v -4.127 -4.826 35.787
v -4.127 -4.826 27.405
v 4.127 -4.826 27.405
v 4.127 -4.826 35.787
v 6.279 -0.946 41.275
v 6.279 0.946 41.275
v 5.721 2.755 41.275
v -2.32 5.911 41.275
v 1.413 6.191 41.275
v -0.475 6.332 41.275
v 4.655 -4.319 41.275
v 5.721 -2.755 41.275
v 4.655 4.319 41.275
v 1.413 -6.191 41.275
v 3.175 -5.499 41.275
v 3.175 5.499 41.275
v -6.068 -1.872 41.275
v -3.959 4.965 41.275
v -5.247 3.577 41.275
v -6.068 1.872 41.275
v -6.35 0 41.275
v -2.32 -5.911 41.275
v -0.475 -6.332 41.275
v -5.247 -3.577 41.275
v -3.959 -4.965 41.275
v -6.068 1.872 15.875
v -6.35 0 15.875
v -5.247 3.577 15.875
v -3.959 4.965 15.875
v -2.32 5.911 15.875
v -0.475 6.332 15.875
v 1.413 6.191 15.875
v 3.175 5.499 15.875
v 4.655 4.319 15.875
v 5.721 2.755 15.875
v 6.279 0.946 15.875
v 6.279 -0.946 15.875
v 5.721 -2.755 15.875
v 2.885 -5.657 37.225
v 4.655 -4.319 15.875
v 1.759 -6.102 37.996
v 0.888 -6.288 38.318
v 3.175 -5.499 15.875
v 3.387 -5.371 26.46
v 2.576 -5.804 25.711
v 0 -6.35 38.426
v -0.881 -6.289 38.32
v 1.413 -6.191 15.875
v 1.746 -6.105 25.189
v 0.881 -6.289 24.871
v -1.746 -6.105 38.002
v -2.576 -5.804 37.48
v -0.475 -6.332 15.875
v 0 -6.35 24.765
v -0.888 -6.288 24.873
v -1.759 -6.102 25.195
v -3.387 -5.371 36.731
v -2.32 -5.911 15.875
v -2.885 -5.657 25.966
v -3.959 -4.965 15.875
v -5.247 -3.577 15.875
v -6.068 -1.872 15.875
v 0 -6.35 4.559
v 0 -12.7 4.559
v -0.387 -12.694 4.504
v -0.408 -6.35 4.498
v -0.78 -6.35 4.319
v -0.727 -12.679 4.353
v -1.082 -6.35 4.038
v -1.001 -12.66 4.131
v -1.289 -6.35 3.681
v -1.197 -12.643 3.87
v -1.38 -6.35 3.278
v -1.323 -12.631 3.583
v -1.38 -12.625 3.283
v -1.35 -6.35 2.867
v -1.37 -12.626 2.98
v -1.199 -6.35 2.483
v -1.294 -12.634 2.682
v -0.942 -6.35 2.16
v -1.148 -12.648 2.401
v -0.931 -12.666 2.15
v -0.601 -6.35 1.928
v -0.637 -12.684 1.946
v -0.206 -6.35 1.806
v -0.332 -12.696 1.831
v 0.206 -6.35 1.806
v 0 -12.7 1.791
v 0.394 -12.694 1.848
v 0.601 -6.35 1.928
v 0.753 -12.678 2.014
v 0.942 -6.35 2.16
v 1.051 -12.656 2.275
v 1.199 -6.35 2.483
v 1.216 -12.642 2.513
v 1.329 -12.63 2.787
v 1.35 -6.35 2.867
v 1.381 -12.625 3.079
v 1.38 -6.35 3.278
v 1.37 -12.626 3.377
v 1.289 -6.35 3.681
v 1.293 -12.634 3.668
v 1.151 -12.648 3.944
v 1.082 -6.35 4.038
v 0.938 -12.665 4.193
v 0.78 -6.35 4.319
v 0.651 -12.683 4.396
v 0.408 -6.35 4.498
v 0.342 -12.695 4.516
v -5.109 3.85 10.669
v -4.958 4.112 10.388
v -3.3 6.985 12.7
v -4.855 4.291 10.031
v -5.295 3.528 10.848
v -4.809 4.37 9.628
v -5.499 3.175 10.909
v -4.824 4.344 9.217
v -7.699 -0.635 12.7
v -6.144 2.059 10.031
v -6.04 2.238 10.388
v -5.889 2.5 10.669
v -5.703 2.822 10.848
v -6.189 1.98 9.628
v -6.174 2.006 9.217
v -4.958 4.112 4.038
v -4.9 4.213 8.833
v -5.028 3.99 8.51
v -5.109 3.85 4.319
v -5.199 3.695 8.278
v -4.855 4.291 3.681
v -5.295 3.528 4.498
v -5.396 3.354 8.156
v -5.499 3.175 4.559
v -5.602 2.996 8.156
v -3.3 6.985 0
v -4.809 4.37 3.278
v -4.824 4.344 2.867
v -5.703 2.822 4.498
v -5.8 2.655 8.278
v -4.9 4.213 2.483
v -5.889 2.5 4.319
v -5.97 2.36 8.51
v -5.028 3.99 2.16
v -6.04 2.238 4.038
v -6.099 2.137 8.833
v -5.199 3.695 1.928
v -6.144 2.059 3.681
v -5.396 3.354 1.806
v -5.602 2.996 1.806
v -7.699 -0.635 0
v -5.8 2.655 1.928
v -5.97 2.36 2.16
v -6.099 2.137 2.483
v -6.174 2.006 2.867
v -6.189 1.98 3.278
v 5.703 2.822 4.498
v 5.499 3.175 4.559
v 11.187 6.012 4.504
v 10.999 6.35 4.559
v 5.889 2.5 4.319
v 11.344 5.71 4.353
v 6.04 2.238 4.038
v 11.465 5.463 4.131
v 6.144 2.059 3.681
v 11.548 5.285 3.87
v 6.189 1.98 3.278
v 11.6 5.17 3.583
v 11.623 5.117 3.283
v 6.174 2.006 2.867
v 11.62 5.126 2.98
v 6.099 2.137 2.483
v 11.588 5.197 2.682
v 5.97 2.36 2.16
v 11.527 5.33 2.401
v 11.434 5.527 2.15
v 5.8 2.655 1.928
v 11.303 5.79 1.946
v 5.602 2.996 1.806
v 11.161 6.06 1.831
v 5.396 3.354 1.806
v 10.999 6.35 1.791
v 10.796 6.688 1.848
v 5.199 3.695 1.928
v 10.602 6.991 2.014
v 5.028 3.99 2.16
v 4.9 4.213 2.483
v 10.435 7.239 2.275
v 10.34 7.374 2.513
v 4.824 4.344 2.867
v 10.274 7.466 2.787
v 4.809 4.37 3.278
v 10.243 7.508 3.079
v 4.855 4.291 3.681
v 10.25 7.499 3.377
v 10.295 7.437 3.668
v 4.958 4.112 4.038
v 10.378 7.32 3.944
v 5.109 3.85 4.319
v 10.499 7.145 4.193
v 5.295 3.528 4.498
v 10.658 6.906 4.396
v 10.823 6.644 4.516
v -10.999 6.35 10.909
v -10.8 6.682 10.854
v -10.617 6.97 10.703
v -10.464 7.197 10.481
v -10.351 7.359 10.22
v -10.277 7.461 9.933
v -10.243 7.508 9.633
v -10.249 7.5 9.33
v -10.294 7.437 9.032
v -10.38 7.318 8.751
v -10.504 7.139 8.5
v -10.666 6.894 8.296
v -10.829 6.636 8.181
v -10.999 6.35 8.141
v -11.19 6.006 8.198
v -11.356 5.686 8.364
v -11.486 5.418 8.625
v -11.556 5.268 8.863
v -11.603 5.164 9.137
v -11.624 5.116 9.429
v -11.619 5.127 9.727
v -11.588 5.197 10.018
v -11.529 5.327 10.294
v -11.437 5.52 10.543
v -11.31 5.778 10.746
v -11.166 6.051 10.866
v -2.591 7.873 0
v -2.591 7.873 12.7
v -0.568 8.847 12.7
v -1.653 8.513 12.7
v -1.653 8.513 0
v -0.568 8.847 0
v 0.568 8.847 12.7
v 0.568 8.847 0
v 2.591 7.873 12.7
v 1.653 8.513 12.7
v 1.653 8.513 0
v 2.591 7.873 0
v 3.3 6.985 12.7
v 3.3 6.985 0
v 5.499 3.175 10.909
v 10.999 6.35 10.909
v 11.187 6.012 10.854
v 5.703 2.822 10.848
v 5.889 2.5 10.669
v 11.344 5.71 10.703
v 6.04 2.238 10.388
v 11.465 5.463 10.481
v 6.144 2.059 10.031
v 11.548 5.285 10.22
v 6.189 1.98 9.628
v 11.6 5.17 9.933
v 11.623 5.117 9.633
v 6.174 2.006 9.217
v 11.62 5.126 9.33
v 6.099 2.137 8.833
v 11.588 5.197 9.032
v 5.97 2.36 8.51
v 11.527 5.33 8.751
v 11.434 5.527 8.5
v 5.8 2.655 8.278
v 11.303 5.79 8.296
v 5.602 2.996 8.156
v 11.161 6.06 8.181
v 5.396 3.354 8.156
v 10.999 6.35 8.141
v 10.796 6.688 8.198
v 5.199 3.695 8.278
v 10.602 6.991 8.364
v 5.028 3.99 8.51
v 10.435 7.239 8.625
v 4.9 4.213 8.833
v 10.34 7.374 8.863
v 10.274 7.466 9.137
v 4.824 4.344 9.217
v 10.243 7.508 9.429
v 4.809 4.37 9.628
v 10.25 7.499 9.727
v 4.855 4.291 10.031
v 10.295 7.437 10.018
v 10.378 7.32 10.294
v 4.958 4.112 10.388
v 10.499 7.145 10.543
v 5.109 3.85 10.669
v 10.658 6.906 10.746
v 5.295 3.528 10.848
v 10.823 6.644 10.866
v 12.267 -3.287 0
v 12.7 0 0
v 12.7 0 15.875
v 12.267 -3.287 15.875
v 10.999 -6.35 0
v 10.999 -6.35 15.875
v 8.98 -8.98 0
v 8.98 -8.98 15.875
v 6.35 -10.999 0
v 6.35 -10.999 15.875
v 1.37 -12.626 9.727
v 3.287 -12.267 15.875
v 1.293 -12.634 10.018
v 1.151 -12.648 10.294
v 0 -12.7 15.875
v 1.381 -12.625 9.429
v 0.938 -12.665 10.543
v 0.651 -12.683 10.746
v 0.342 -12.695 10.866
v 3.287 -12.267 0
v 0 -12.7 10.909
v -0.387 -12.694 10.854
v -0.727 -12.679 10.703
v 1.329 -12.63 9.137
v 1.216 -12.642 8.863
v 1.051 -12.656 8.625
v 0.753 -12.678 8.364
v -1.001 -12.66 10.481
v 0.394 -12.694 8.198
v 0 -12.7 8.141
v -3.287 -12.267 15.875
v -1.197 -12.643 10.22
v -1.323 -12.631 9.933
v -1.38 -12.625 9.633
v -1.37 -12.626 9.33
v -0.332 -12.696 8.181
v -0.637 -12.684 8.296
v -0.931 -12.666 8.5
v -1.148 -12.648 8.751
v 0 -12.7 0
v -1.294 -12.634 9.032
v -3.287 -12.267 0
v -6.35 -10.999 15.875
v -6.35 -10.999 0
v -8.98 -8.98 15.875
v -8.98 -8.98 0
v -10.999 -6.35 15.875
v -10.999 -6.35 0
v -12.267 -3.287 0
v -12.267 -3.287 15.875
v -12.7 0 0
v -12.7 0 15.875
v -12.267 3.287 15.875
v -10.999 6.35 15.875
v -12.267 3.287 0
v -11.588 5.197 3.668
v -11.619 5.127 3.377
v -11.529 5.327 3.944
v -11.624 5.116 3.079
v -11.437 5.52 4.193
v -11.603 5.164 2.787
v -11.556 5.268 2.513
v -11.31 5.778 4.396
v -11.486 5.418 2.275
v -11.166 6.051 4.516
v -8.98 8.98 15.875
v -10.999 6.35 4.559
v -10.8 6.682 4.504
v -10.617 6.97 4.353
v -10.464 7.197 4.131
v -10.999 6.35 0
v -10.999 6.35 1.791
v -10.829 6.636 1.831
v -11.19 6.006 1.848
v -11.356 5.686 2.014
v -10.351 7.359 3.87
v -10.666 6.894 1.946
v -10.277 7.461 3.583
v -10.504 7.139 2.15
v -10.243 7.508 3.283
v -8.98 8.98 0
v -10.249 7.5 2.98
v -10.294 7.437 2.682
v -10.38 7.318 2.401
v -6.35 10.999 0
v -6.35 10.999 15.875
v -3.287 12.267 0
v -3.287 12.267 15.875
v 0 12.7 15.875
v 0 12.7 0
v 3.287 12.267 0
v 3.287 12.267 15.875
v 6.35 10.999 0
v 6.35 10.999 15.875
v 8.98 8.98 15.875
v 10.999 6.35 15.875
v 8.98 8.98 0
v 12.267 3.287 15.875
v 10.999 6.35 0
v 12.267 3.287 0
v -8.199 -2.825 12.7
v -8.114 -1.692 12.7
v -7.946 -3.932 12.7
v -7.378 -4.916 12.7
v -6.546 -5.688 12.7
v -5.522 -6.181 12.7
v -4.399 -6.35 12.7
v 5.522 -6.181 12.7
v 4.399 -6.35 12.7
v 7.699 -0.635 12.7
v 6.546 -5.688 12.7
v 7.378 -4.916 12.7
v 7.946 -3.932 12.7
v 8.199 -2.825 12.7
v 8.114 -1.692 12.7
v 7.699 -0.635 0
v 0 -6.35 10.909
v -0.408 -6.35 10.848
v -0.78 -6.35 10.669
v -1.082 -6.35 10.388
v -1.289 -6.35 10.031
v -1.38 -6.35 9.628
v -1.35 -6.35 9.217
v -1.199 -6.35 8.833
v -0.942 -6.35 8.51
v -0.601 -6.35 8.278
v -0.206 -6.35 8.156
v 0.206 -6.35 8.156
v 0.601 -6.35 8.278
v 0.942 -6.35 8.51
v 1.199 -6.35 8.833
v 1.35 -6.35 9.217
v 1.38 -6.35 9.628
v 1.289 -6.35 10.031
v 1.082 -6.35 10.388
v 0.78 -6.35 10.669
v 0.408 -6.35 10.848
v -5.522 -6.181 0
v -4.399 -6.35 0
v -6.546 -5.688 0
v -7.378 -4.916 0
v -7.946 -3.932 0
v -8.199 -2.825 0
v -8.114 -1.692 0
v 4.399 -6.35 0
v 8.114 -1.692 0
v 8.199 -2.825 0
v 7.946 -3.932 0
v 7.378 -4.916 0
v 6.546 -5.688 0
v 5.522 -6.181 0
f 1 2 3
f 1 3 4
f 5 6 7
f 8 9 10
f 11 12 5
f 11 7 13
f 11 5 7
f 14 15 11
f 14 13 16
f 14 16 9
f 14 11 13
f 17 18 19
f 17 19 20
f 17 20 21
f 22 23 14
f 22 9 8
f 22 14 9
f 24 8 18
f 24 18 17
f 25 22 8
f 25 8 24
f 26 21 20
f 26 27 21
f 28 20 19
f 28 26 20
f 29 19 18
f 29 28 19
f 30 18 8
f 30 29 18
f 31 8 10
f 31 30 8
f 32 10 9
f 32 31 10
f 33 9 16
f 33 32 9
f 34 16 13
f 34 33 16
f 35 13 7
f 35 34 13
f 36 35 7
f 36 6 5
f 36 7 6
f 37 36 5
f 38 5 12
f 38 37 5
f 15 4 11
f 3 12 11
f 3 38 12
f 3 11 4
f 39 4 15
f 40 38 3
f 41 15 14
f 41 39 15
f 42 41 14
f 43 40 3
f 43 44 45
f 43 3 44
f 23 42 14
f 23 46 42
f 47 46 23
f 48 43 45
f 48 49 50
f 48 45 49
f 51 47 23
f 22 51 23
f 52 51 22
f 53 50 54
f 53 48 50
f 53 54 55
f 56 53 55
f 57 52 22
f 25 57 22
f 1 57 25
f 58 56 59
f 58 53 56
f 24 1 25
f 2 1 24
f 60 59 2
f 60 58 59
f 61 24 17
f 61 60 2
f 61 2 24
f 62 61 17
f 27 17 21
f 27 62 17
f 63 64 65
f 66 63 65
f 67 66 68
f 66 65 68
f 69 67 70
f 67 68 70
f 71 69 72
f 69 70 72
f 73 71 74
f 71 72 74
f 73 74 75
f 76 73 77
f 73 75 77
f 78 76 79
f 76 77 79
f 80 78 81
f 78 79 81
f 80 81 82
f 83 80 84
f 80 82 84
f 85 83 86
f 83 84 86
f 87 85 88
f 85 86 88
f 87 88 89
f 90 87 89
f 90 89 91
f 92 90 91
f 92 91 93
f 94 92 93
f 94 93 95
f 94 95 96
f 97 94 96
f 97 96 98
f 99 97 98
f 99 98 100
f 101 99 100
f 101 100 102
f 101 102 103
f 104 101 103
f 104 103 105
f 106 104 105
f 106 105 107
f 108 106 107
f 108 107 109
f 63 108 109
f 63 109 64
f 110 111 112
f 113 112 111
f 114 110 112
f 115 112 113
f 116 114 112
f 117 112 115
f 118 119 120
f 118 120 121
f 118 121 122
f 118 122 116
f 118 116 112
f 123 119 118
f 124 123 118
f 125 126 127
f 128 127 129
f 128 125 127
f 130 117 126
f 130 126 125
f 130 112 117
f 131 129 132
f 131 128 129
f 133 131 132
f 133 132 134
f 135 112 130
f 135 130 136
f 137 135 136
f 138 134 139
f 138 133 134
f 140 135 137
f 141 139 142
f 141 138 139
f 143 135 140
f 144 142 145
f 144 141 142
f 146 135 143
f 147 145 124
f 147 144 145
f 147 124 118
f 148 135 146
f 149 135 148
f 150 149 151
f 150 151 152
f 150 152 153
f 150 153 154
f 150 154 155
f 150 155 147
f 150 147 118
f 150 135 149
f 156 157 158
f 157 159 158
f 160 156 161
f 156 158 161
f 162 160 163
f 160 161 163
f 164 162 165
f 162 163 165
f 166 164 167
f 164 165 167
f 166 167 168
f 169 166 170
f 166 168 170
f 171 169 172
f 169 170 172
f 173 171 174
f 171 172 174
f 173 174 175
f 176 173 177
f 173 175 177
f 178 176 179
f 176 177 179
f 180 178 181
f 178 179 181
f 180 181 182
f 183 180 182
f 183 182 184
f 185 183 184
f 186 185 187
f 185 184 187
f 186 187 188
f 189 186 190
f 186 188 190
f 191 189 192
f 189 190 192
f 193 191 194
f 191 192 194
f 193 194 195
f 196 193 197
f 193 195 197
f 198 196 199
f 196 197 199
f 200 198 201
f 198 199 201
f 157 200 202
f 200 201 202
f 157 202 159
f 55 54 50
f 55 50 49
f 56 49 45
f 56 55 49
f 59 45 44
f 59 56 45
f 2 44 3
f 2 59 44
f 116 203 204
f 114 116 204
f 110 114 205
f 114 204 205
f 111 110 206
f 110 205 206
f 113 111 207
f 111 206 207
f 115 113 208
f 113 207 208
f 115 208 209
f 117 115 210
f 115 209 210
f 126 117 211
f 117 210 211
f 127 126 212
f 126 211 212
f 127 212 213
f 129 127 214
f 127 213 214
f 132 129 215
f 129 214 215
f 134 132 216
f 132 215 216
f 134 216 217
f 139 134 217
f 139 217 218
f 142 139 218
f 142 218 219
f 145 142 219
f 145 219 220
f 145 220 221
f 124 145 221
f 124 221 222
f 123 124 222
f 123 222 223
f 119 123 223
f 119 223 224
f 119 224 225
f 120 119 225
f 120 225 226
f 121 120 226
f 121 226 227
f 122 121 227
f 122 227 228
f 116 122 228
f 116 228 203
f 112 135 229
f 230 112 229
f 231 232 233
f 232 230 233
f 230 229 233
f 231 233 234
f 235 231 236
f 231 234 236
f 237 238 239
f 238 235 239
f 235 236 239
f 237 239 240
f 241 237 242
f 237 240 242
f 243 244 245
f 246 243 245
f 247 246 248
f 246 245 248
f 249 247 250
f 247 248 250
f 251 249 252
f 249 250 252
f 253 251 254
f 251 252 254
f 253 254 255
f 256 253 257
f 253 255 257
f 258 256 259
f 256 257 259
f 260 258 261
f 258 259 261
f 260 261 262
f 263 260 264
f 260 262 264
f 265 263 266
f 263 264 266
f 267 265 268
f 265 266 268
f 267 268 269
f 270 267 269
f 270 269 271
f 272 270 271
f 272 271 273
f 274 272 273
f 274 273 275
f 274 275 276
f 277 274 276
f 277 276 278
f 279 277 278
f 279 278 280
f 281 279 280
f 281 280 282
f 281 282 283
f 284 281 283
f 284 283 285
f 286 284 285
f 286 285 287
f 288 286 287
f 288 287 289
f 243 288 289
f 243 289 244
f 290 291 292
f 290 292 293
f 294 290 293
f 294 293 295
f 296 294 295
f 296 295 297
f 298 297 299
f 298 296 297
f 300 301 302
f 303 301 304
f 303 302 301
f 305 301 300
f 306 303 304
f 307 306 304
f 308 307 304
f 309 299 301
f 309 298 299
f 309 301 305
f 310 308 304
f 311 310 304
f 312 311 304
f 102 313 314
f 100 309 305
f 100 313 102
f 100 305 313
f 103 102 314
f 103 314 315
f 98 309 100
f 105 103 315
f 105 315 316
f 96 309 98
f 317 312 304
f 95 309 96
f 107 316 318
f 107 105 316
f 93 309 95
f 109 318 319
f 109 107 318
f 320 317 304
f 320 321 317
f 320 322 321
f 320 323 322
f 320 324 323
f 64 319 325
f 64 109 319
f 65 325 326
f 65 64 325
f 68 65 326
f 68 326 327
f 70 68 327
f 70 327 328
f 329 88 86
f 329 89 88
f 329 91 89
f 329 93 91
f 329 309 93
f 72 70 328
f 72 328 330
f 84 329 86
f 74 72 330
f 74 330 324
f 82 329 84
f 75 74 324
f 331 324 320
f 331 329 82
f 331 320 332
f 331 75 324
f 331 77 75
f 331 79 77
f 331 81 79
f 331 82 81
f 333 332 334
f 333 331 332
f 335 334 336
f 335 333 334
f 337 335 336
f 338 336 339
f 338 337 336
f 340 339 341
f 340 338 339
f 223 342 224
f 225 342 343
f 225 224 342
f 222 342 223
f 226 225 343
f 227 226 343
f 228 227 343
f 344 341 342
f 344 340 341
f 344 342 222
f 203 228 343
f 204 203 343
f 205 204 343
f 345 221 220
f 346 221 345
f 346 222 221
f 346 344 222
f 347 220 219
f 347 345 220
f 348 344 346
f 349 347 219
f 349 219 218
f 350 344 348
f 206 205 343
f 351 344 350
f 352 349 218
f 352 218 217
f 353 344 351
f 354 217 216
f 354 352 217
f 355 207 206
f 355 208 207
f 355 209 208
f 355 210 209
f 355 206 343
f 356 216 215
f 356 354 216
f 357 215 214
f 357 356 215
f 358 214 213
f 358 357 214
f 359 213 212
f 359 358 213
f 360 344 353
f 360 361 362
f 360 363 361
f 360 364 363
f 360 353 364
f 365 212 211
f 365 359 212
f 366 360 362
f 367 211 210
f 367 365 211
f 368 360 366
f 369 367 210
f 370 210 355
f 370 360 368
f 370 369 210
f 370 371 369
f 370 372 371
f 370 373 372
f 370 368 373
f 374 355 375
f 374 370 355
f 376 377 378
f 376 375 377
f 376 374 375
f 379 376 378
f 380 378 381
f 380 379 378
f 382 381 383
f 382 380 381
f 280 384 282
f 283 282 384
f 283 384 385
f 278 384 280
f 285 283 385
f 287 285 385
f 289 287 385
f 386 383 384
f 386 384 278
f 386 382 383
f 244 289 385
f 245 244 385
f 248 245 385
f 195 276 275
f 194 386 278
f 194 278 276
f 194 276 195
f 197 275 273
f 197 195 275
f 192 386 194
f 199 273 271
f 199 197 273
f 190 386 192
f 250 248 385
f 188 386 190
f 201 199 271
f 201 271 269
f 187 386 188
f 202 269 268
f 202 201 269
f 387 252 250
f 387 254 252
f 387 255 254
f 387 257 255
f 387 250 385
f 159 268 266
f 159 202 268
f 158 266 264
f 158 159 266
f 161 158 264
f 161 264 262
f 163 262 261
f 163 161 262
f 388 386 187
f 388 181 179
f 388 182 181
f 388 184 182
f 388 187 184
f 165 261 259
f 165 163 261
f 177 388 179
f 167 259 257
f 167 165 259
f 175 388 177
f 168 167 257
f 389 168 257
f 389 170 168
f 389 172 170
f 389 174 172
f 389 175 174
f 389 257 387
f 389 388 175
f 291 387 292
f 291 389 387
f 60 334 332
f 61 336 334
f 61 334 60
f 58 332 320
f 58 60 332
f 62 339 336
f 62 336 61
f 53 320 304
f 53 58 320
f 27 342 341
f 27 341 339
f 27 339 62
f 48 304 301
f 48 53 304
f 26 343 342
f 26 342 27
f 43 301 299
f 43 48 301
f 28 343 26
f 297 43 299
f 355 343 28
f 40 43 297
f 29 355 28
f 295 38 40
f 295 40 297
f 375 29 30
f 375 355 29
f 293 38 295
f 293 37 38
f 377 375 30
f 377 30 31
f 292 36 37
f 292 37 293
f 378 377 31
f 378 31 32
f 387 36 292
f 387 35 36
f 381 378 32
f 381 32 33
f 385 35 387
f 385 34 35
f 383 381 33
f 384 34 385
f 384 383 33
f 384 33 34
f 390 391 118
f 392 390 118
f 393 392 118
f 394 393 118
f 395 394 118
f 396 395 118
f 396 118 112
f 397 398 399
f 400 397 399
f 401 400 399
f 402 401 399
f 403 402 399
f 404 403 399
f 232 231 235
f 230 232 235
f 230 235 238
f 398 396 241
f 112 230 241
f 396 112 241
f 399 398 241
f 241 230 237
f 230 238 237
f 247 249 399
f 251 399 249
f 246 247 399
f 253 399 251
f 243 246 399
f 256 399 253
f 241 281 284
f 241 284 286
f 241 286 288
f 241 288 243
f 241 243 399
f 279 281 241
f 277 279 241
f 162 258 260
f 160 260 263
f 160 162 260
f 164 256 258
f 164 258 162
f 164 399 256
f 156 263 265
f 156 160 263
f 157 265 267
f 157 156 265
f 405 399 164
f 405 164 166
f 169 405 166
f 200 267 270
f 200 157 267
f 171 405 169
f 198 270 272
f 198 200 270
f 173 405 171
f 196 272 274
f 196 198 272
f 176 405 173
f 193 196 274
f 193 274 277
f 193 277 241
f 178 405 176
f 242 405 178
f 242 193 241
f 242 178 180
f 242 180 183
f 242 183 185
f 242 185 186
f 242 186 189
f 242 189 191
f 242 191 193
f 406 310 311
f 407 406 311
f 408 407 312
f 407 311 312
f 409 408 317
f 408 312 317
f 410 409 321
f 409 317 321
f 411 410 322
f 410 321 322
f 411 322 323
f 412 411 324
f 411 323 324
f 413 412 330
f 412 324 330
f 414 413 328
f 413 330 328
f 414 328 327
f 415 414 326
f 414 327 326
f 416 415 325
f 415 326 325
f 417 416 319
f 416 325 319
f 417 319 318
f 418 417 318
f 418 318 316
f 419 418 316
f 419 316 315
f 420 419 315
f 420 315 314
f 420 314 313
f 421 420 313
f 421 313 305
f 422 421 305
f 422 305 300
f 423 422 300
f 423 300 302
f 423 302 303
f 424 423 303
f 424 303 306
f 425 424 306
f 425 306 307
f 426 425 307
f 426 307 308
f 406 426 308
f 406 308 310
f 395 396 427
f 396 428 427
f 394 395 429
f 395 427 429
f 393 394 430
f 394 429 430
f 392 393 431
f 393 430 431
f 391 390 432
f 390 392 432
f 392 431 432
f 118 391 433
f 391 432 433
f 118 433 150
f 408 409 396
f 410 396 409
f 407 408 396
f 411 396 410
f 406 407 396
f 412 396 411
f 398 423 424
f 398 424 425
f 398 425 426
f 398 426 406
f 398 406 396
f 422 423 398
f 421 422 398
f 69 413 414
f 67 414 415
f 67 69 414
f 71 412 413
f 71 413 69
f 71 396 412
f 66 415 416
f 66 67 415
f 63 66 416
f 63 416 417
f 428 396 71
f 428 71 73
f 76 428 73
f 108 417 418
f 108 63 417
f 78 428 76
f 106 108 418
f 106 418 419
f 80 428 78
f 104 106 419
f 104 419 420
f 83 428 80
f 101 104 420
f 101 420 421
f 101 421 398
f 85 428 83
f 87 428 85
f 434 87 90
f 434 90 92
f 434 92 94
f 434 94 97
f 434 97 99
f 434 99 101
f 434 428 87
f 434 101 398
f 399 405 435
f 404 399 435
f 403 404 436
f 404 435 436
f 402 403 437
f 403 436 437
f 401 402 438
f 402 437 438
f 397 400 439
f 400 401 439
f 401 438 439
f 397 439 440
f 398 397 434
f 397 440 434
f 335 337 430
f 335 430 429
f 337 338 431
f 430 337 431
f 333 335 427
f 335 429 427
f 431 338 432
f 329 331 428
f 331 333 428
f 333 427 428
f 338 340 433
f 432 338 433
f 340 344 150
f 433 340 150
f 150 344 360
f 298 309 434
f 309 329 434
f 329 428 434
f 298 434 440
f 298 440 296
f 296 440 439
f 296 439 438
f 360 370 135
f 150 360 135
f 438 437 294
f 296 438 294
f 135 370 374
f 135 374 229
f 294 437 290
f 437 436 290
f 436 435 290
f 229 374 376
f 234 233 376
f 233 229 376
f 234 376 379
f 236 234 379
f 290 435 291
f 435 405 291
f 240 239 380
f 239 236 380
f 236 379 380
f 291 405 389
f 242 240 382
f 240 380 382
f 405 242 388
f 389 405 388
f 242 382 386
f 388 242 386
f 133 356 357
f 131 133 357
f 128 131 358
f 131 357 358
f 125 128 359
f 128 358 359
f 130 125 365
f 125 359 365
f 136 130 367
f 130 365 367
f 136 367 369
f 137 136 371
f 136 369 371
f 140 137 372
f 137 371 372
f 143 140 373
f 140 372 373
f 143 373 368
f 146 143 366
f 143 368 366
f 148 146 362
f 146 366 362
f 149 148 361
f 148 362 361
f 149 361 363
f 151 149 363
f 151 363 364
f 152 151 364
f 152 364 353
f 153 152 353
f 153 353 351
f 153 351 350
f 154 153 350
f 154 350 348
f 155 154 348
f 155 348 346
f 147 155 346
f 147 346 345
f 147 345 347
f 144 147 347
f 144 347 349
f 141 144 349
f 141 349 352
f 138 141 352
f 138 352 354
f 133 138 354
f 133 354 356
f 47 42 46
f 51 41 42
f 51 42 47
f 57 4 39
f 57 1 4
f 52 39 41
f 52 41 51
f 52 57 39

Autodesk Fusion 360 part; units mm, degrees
sketch "Sketch1" plane through (0, 0, 0) normal (0, 0, 1) x (1, 0, 0)
  line L0 (10.9985, -6.35) -> (0, 12.7)
  line L1 (0, 12.7) -> (-10.9985, -6.35)
  line L2 (-10.9985, -6.35) -> (10.9985, -6.35)
  line L3 (3.6662, -6.35) -> (7.3323, 0) construction
  line L4 (7.3323, 0) -> (3.6662, 6.35) construction
  line L5 (3.6662, 6.35) -> (-3.6662, 6.35) construction
  line L6 (-3.6662, 6.35) -> (-7.3323, 0) construction
  line L7 (-7.3323, 0) -> (-3.6662, -6.35) construction
  line L8 (-3.6662, -6.35) -> (3.6662, -6.35) construction
  circle A0 centre (0, 0) radius 12.7
  arc A1 (3.2996, 6.985) -> (-3.2996, 6.985) centre (0, 5.08) ccw
  arc A2 (-7.699, -0.635) -> (-4.3994, -6.35) centre (-4.3994, -2.54) ccw
  arc A3 (4.3994, -6.35) -> (7.699, -0.635) centre (4.3994, -2.54) ccw
  dimension "d1" = 6.35
  dimension "d2" = 25.4
  dimension "d4" = 3.81
  dimension "d6" = 360
extrude "Extrude1" add sketch "Sketch1" along normal blind 12.7 contours L0 L2 A3 | L2 A0 | L0 A0 | L1 A0 | L1 L2 A2 | L0 L1 A1
sketch "Sketch2" plane through (0, 0, 0) normal (0, 1, 0) x (1, 0, 0)
  line L0 (0, -12.7) -> (0, -15.875)
  line L1 (-12.7, -12.7) -> (12.7, -12.7)
  line L2 (-12.7, 0) -> (12.7, 0)
  line L3 (12.7, -12.7) -> (12.7, -15.875)
  line L4 (0, -15.875) -> (12.7, -15.875)
  line L5 (0, 0) -> (0, -3.175) construction
  line L6 (0, -3.175) -> (0, -6.35) construction
  line L7 (0, -6.35) -> (0, -9.525) construction
  line L8 (0, -9.525) -> (0, -12.7) construction
  point P0 (0, -9.525)
  point P1 (0, -6.35)
  point P2 (0, -3.175)
  dimension "d9" = 3.175
  dimension "d10" = 12.7
revolve "Revolve1" add sketch "Sketch2" angle 360 about axis through (0, 0, 12.7) along (0, 0, 1)
sketch "Sketch3" plane through (0, 0, 15.875) normal (0, 0, 1) x (-1, 0, 0)
  circle A0 centre (0, 0) radius 12.7
  circle A1 centre (0, 0) radius 6.35
  dimension "d12" = 12.7
extrude "Extrude2" add sketch "Sketch3" along normal blind 25.4 contours A1
sketch "Sketch4" plane through (0, 0, 0) normal (1, 0, 0) x (0, 1, 0)
  line L0 (6.35, 41.275) -> (-6.35, 41.275)
  line L1 (-6.35, 15.875) -> (-6.35, 24.765) construction
  line L2 (-6.35, 24.765) -> (-4.826, 27.4046)
  line L3 (-4.826, 27.4046) -> (-4.826, 35.7866)
  line L4 (-4.826, 35.7866) -> (-6.35, 38.4263)
  line L5 (-6.35, 41.275) -> (-6.35, 38.4263) construction
  line L6 (-6.35, 38.4263) -> (-6.35, 24.765)
  line L7 (-6.35, 15.875) -> (6.35, 15.875)
  dimension "d15" = 8.89
  dimension "d16" = 8.382
  dimension "d17" = 150
  dimension "d18" = 150
  dimension "d19" = 1.524
extrude "Extrude3" cut sketch "Sketch4" along normal mid plane 12.7
hole "Hole1" at (0, 0, 9.525) at (0, 0, 3.175) direction (0, -1, 0) diameter 2.7686 depth 12.7 tip angle 180
pattern_circular "C-Pattern1" count 3 over 360 about axis through (0, 0, 0) along (0, 0, 1) of "Hole1"
equation "d7 = shankLength"
equation "d18 = d17"
equation "d20 = d12 / 2"
equation "shankLength = 0.5 in"
